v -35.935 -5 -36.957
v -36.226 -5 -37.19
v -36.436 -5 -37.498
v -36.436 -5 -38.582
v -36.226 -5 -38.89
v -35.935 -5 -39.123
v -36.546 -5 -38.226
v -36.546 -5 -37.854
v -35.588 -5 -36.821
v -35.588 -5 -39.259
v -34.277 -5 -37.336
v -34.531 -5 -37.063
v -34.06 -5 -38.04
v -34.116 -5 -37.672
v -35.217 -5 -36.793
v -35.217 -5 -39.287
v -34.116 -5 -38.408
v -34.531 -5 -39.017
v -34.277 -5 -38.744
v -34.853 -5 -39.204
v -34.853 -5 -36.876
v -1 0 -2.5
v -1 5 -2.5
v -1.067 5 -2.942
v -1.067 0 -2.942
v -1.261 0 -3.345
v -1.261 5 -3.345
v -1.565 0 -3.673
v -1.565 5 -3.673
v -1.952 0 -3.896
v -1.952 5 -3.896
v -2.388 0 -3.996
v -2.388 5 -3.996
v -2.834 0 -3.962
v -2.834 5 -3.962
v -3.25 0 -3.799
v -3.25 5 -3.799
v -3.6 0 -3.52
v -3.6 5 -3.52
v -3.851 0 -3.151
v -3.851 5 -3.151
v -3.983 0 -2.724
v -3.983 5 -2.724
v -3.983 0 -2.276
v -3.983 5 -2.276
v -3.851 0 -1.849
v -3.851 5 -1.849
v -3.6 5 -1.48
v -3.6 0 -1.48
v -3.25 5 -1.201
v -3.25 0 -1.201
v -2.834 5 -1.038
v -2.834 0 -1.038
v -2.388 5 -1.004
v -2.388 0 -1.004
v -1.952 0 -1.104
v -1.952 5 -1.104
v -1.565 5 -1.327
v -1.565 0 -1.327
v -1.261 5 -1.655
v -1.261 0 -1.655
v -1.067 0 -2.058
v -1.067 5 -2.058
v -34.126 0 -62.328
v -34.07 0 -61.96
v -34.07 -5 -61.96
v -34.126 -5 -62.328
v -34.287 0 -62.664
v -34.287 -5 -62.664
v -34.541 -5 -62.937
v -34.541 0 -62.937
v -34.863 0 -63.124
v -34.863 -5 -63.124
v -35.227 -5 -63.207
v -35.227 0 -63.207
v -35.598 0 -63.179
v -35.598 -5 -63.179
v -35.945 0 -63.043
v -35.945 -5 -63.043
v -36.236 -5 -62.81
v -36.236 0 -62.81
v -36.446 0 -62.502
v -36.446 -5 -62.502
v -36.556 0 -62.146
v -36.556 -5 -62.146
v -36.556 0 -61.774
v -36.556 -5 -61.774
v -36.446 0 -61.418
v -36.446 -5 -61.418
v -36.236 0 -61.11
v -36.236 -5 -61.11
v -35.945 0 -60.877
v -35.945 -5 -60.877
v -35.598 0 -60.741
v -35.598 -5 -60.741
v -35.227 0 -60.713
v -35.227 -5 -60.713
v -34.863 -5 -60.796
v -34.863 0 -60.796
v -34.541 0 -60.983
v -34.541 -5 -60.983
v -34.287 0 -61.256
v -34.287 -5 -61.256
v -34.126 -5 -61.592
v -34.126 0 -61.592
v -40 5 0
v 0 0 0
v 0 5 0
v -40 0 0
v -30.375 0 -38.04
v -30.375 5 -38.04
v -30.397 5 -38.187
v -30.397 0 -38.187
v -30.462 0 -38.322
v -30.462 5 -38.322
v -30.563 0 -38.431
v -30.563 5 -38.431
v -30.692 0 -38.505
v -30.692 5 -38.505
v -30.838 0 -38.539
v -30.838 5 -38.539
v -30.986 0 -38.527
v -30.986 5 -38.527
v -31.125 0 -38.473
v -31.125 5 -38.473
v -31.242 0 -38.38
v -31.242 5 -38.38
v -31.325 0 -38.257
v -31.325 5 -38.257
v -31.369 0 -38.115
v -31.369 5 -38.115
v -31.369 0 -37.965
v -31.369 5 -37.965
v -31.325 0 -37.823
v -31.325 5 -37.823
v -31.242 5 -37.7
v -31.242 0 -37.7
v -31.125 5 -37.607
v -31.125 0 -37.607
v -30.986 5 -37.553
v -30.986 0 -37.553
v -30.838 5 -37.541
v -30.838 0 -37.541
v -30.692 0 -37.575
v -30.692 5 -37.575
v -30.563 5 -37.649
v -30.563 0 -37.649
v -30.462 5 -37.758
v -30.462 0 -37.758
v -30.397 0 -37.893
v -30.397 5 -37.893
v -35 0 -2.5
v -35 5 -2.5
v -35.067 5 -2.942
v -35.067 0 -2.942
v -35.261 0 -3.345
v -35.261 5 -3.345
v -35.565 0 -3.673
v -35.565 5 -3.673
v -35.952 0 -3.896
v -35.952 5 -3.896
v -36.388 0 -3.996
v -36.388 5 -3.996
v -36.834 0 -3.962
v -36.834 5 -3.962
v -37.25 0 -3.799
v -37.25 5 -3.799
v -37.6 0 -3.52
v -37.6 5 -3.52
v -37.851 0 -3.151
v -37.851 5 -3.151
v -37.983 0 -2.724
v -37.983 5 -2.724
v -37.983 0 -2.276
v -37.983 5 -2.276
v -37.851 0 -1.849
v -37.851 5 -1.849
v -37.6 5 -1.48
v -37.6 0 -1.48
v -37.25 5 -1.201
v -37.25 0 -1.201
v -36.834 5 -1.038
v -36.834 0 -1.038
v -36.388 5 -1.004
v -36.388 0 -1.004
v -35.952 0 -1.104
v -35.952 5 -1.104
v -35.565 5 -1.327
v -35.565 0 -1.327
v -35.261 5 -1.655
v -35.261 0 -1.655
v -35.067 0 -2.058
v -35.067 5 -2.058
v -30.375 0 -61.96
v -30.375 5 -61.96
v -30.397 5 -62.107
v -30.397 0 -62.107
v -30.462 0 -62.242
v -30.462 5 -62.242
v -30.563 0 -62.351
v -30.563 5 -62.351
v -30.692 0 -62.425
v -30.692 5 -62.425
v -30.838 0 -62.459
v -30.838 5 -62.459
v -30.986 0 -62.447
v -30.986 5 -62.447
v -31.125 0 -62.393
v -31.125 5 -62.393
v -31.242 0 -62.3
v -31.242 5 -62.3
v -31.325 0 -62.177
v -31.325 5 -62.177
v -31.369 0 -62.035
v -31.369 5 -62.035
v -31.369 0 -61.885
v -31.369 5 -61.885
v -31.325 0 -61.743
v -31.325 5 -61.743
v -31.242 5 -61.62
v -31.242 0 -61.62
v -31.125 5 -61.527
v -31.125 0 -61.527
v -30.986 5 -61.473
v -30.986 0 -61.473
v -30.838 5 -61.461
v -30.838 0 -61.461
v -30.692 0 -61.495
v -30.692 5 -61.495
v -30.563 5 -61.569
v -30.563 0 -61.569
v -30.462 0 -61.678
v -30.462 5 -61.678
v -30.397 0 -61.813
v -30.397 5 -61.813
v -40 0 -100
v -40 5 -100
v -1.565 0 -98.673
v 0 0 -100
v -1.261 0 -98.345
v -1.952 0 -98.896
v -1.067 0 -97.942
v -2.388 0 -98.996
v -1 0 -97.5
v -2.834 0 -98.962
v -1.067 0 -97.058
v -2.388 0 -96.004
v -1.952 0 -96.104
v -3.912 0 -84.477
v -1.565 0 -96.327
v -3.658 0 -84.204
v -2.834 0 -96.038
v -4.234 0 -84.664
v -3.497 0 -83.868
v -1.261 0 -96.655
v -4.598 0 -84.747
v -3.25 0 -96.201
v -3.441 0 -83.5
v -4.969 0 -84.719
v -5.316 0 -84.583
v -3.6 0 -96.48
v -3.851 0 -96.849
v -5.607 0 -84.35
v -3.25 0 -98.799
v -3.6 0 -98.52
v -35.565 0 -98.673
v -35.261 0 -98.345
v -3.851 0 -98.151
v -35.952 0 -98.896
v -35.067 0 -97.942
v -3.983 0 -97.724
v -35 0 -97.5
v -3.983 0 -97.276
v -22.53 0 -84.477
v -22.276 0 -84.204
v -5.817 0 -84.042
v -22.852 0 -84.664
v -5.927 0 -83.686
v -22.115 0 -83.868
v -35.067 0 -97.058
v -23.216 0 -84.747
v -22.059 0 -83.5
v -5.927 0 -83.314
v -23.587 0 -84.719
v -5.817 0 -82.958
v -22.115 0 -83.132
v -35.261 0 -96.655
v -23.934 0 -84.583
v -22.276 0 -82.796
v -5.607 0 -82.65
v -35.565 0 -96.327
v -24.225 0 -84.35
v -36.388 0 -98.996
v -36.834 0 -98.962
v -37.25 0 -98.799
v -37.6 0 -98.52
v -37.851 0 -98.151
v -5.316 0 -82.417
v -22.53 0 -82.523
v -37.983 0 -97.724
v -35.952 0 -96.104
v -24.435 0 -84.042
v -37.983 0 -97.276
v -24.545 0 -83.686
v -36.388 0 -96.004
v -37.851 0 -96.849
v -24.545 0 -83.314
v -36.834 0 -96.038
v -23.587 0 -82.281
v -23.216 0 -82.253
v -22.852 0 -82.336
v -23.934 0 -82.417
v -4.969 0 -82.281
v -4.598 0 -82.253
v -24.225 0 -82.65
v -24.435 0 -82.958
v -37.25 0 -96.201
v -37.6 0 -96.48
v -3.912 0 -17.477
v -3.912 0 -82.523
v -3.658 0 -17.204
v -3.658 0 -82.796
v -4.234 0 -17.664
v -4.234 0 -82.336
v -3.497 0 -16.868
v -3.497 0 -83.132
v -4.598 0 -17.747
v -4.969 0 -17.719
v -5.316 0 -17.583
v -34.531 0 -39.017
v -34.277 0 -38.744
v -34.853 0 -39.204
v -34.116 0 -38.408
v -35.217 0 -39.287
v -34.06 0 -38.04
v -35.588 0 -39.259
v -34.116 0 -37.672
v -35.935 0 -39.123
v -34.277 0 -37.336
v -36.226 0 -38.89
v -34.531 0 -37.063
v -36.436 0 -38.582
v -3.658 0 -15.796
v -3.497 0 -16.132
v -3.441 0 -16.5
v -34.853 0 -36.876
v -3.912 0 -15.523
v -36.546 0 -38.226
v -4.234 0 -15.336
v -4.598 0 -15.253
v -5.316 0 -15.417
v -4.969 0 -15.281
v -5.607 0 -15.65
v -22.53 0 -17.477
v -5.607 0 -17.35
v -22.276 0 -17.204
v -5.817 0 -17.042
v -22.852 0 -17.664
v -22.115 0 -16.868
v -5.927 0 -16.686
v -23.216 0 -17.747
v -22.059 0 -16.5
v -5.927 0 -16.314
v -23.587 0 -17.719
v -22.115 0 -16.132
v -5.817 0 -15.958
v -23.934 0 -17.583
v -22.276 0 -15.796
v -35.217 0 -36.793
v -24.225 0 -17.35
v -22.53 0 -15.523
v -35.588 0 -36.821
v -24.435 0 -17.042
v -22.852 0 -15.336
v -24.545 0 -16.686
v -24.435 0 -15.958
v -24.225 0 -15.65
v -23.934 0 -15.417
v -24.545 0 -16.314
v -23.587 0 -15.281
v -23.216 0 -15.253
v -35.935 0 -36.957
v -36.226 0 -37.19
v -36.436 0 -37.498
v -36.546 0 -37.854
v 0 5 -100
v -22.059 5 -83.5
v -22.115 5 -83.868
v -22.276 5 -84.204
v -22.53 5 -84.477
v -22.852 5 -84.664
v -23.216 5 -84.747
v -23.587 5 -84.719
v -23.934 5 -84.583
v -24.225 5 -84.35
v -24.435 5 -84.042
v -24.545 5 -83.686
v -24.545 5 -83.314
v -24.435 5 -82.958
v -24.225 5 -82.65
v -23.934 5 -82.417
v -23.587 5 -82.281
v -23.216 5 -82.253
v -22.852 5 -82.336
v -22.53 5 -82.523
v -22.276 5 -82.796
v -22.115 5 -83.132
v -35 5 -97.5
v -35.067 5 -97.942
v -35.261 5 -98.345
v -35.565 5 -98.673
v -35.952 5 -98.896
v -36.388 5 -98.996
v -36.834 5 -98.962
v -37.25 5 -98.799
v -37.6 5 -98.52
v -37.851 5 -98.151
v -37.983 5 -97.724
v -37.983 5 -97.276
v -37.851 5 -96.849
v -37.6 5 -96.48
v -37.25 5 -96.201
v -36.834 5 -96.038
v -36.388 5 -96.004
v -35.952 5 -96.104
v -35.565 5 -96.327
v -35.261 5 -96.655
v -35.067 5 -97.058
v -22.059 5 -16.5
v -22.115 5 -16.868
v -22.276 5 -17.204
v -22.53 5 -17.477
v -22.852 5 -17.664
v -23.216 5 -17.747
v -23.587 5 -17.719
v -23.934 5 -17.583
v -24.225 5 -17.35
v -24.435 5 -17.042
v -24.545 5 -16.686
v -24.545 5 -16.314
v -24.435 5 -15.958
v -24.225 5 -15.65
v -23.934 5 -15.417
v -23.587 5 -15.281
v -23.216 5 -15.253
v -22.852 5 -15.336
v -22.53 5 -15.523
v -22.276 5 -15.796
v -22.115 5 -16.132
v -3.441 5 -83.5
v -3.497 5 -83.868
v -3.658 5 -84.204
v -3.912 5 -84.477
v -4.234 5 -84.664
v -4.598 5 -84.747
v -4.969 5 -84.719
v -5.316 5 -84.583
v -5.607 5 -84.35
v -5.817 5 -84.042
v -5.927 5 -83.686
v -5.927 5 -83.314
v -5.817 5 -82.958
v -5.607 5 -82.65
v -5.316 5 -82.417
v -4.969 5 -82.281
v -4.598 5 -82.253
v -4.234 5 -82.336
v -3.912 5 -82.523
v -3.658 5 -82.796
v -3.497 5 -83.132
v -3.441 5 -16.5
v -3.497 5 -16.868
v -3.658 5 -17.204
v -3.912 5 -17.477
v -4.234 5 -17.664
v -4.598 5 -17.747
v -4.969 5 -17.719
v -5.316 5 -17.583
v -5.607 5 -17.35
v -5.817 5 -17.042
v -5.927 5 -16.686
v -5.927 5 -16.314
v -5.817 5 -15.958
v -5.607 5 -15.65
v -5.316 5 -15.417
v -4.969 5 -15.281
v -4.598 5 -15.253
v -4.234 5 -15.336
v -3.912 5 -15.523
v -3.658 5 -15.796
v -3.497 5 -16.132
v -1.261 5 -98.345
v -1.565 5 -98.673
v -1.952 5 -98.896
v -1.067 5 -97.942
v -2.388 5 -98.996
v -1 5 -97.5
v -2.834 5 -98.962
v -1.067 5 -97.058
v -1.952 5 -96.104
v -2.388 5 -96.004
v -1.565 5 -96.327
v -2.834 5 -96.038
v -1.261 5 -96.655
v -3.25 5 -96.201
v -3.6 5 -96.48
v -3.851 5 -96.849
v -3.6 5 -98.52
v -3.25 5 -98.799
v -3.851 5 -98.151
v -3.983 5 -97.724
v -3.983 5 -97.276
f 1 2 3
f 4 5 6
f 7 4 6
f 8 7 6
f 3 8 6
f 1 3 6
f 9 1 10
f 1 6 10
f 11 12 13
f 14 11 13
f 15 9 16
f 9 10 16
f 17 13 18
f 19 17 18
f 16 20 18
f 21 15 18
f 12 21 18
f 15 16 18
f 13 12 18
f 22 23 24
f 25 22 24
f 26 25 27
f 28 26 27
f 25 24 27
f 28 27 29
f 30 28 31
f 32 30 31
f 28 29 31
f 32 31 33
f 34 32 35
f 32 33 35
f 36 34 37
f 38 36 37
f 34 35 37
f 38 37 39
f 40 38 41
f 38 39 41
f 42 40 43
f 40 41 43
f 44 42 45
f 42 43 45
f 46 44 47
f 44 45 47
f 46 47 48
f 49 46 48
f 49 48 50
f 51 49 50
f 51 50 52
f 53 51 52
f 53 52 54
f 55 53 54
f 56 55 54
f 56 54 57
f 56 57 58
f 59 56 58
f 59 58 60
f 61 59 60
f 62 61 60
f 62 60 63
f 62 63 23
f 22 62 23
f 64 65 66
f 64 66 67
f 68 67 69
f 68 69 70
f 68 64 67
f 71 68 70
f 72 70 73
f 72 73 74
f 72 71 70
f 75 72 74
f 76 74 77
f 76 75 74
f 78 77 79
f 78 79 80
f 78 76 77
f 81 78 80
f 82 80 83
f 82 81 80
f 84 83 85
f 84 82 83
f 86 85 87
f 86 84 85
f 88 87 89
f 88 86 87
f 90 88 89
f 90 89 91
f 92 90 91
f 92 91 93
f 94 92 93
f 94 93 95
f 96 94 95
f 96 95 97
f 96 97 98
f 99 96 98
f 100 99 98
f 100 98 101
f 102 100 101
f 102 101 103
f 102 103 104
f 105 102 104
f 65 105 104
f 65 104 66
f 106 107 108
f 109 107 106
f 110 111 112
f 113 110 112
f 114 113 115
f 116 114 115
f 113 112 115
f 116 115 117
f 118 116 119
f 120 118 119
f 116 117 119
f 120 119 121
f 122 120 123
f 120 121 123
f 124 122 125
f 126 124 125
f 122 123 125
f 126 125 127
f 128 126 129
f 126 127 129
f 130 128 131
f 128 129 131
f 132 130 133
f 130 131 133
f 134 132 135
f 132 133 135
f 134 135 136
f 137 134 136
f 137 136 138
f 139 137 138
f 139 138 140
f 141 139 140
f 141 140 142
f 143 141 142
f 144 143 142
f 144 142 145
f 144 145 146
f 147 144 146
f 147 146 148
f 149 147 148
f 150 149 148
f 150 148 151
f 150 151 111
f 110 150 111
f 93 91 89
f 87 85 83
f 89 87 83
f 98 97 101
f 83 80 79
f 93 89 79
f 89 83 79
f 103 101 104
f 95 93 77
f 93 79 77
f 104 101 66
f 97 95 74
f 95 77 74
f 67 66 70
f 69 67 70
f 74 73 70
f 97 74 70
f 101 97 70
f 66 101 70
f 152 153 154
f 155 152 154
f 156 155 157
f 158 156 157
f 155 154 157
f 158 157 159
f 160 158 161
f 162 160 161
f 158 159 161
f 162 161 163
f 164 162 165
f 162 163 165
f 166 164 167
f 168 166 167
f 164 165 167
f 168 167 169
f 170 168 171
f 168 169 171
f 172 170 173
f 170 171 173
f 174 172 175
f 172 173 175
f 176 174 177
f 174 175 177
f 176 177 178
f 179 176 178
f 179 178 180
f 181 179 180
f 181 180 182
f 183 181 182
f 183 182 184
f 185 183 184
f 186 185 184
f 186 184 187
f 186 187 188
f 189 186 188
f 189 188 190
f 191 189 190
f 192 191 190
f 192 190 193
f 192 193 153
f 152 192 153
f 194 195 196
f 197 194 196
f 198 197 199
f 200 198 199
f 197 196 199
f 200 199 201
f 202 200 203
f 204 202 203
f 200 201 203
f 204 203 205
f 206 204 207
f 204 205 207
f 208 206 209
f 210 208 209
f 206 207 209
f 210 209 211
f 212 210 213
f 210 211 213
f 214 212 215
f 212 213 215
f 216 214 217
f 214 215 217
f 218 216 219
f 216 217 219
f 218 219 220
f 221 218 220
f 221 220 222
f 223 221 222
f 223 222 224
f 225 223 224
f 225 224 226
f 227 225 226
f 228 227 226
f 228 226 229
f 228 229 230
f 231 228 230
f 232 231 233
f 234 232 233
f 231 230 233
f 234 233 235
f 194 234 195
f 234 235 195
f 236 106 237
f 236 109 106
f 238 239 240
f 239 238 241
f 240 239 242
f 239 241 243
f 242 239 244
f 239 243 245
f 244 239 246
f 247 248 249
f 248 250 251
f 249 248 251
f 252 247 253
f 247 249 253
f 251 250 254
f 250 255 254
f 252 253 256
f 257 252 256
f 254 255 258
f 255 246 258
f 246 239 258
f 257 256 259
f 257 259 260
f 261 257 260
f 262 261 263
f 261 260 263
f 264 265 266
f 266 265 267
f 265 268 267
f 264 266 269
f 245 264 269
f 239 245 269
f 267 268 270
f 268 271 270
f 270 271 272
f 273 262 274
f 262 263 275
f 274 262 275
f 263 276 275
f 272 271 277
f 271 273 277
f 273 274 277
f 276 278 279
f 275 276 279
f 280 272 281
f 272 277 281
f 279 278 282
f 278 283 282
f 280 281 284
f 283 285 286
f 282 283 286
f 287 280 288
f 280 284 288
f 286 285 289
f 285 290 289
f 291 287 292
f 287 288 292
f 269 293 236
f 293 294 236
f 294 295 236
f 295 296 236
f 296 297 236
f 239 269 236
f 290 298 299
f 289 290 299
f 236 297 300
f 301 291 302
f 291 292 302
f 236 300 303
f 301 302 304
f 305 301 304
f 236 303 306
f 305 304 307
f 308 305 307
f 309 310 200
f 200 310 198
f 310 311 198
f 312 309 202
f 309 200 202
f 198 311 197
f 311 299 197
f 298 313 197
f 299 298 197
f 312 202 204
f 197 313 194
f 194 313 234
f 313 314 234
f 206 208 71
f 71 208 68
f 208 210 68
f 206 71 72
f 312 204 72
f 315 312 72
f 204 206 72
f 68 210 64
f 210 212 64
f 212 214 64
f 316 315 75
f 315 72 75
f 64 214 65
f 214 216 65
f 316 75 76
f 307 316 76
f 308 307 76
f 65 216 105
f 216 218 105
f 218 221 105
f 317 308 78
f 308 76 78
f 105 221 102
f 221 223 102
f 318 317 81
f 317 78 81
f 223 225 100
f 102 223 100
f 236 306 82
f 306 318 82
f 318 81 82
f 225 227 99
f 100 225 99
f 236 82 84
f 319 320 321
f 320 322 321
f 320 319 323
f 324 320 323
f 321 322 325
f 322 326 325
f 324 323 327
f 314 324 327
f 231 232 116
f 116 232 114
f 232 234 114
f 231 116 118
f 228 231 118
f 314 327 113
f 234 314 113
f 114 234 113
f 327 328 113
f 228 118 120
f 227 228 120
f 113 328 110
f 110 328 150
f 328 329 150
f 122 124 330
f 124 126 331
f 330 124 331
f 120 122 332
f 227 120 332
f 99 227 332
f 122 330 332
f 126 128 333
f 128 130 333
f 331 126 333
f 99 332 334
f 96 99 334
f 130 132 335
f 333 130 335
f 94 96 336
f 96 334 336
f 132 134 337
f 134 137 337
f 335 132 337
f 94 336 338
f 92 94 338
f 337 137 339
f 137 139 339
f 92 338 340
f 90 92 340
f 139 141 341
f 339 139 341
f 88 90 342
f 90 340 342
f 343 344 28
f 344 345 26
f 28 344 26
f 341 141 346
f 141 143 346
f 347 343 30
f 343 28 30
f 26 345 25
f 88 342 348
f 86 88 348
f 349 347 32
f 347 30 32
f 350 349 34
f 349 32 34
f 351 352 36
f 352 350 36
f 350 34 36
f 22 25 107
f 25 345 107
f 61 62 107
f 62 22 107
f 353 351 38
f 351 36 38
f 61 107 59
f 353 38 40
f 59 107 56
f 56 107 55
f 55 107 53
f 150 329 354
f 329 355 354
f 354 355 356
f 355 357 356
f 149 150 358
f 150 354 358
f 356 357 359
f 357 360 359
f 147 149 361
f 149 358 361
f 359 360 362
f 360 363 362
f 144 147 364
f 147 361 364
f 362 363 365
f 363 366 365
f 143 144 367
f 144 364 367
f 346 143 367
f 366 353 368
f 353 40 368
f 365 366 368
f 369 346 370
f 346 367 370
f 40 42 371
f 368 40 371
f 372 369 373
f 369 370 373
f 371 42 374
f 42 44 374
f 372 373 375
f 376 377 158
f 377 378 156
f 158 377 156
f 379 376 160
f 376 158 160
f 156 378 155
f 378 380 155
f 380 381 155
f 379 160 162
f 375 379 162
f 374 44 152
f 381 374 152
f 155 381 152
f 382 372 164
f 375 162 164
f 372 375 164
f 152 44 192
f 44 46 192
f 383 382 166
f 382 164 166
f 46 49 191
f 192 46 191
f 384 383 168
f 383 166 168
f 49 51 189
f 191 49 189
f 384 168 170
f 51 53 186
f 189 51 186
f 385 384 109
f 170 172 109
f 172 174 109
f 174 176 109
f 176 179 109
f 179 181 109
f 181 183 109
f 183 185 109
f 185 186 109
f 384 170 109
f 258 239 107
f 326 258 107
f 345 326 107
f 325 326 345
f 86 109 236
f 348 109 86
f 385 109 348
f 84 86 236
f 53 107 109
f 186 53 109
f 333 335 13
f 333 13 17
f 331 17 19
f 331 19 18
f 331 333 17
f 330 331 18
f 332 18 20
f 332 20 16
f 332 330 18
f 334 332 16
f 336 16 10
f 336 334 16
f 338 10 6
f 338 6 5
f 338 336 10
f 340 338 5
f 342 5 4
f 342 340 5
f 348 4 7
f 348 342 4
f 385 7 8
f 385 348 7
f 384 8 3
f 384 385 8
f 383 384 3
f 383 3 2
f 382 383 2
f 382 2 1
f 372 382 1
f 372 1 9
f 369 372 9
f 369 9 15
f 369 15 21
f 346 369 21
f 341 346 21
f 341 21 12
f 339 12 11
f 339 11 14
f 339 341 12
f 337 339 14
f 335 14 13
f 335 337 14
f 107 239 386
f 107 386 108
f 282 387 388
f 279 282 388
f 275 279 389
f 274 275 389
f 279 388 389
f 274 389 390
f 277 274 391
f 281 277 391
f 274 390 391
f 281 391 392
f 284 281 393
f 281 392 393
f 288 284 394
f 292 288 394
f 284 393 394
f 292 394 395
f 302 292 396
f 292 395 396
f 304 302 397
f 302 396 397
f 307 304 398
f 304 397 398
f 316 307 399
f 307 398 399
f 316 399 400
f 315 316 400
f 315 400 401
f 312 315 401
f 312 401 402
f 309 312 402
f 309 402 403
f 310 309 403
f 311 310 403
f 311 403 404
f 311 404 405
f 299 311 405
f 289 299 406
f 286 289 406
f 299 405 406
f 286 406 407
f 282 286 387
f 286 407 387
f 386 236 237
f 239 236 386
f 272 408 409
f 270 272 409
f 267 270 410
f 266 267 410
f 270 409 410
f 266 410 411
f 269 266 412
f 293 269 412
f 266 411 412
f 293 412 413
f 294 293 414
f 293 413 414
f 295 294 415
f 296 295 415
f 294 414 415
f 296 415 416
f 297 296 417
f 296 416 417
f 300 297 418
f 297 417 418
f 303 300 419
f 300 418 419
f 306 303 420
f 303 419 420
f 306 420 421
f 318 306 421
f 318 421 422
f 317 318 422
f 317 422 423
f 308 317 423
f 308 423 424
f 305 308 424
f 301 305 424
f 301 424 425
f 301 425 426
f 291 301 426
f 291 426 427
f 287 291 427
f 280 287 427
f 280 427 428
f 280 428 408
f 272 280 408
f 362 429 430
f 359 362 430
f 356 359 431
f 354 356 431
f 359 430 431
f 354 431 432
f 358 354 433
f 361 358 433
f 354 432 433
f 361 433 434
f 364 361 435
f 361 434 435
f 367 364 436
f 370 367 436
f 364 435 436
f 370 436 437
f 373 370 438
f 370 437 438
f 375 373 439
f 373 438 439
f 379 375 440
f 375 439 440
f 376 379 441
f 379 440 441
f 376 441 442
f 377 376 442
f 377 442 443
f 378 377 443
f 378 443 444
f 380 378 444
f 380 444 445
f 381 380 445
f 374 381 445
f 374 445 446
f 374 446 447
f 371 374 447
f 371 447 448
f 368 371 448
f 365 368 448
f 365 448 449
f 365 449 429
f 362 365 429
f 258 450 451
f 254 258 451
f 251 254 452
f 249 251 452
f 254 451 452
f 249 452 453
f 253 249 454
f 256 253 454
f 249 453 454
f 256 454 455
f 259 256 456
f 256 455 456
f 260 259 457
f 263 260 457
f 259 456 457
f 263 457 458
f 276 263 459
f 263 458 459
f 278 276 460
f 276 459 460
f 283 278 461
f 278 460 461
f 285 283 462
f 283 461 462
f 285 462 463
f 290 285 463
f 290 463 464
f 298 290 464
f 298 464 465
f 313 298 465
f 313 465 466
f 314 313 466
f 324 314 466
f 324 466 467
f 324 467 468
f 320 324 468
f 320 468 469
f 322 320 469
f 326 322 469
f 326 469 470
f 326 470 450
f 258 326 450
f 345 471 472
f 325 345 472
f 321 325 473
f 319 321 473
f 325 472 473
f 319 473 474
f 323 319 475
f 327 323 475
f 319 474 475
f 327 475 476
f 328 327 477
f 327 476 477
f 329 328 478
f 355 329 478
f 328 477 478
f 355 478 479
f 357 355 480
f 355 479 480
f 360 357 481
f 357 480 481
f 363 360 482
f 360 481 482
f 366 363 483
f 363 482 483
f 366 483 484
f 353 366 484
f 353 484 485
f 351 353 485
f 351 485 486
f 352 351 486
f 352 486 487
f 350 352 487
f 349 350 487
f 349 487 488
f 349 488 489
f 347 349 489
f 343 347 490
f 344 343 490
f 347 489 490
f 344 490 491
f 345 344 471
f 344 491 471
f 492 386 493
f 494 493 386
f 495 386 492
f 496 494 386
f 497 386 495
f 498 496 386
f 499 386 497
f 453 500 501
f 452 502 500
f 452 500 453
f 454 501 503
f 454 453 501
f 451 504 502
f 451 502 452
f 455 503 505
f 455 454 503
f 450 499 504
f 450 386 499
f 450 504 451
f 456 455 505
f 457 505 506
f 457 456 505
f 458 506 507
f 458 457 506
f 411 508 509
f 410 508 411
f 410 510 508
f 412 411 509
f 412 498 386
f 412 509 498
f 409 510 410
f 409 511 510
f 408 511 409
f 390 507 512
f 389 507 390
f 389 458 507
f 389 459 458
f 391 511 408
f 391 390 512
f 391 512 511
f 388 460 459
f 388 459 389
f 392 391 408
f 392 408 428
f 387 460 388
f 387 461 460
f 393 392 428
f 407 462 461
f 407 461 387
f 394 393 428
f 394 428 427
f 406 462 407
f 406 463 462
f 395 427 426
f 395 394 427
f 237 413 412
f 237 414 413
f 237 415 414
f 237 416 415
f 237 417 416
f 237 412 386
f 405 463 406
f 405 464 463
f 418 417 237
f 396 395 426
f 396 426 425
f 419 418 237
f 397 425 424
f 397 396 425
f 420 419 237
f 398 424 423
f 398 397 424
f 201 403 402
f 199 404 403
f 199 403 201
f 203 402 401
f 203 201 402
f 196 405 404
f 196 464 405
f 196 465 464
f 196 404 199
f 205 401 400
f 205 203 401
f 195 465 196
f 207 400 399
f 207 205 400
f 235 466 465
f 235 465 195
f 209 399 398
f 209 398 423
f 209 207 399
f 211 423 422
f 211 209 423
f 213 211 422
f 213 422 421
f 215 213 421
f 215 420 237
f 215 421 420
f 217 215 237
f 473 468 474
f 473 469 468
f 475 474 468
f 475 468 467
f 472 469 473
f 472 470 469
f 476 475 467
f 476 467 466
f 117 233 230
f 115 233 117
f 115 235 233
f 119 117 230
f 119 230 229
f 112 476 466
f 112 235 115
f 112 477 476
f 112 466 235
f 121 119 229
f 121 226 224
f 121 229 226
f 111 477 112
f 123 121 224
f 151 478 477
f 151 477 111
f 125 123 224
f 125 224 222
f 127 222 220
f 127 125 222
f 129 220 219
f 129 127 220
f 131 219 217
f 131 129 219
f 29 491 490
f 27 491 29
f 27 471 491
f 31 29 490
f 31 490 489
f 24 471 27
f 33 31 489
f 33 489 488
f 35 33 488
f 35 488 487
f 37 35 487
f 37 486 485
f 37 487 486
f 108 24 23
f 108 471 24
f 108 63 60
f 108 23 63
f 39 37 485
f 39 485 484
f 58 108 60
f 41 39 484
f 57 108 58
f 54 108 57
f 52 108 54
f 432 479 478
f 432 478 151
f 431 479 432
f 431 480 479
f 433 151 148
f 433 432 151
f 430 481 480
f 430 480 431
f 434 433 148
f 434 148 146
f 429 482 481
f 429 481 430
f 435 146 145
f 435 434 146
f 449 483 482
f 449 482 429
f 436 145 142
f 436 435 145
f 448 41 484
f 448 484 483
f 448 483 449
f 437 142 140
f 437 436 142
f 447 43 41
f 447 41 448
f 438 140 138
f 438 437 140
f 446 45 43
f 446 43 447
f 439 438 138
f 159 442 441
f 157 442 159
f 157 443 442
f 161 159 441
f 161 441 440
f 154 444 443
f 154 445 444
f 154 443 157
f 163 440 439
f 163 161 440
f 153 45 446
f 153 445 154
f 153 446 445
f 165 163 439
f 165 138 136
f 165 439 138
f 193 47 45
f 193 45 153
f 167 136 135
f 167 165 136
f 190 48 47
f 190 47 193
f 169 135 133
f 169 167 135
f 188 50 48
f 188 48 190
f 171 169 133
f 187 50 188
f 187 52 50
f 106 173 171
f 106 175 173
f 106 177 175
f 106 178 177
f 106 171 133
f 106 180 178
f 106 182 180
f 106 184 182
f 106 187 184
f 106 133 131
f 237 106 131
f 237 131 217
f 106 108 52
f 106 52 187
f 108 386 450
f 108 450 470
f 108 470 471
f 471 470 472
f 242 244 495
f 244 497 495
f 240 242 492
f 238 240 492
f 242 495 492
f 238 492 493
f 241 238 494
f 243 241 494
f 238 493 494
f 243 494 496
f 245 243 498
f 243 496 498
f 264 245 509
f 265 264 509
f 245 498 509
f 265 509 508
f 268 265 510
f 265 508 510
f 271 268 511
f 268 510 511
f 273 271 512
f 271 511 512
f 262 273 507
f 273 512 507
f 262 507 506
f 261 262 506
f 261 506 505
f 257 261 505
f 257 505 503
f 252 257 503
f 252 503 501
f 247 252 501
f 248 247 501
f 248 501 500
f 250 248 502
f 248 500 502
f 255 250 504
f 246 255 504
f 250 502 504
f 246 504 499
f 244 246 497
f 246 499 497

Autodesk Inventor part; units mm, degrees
ref_plane "YZ Plane" through (0, 0, 0) normal (1, 0, 0) x (0, 1, 0)
ref_plane "XZ Plane" through (0, 0, 0) normal (0, 1, 0) x (-1, 0, 0)
ref_plane "XY Plane" through (0, 0, 0) normal (0, 0, 1) x (1, 0, 0)
sketch "Boceto1" plane through (0, 0, 0) normal (0, 1, 0) x (-1, 0, 0)
  line L0 (0, 0) -> (40, 0)
  line L1 (40, 0) -> (40, -100)
  line L2 (40, -100) -> (0, -100)
  line L3 (0, -100) -> (0, 0)
  circle A0 centre (19.95, -16.5) radius 1.5
  circle A1 centre (4, -16.5) radius 1.5
  circle A2 centre (19.95, -83.5) radius 1.5
  circle A3 centre (4, -83.5) radius 1.5
  point P0 (20, 0)
  dimension "d0" = 40
  dimension "d1" = 100
  dimension "d2" = 3
  dimension "d3" = 3
  dimension "d4" = 3
  dimension "d5" = 3
  dimension "d6" = 16.5
  dimension "d7" = 4
  dimension "d8" = 15.95
  dimension "d9" = 16.5
  dimension "d10" = 16.5
  dimension "d11" = 16.5
  dimension "d12" = 4
  dimension "d13" = 15.95
extrude "Extrusión1" add sketch "Boceto1" along normal blind 5
sketch "Boceto2" plane through (0, 5, 0) normal (0, 1, 0) x (1, 0, 0)
  circle A0 centre (-2.5, 2.5) radius 1.5
  line L0 (0, 0) -> (0, 100) projected
  line L1 (-40, 0) -> (0, 0) projected
  circle A1 centre (-2.5, 97.5) radius 1.5
  line L2 (0, 100) -> (-40, 100) projected
  dimension "d16" = 3
  dimension "d17" = 2.5
  dimension "d18" = 2.5
  dimension "d19" = 3
  dimension "d20" = 2.5
  dimension "d21" = 2.5
extrude "Extrusión2" cut sketch "Boceto2" against normal blind 5
sketch "Boceto3" plane through (0, 5, 0) normal (0, 1, 0) x (1, 0, 0)
  line L0 (-40, 0) -> (0, 0) projected
  line L1 (-14.618, 24) -> (-8, 24)
  line L2 (-8, 24) -> (-8, 9)
  line L3 (-8, 9) -> (-14.618, 9)
  line L4 (-14.618, 9) -> (-14.618, 24)
  line L5 (0, 0) -> (0, 100) projected
  line L6 (-14.618, 91) -> (-8, 91)
  line L7 (-8, 91) -> (-8, 76)
  line L8 (-8, 76) -> (-14.618, 76)
  line L9 (-14.618, 76) -> (-14.618, 91)
  line L10 (0, 100) -> (-40, 100) projected
  dimension "d33" = 15
  dimension "d34" = 6.618
  dimension "d35" = 9
  dimension "d36" = 8
  dimension "d37" = 15
  dimension "d38" = 6.618
  dimension "d39" = 8
  dimension "d40" = 9
sketch "Boceto4" plane through (0, 5, 0) normal (0, 1, 0) x (1, 0, 0)
  point P0 (0, 0)
extrude "Extrusión3" cut sketch "Boceto3" against normal blind 0.5
sketch "Boceto5" plane through (0, 5, 0) normal (0, 1, 0) x (1, 0, 0)
  circle A0 centre (-19.95, 16.5) radius 1.5 projected
  circle A1 centre (-19.95, 16.5) radius 1.5
  circle A2 centre (-4, 16.5) radius 1.5 projected
  circle A3 centre (-4, 16.5) radius 1.5
  circle A4 centre (-19.95, 83.5) radius 1.5 projected
  circle A5 centre (-19.95, 83.5) radius 1.5
  circle A6 centre (-4, 83.5) radius 1.5 projected
  circle A7 centre (-4, 83.5) radius 1.5
  point P0 (0, 0)
extrude "Extrusión4" add sketch "Boceto5" against normal blind 5
sketch "Boceto6" plane through (0, 5, 0) normal (0, 1, 0) x (1, 0, 0)
  line L0 (-8, 24) -> (-8, 9) projected
  line L1 (-8, 9) -> (-8, 16.5)
  line L2 (-8, 16.5) -> (-8, 19.5)
  line L3 (-14.618, 9) -> (-14.618, 24) projected
  line L4 (-14.618, 9) -> (-14.618, 16.5)
  circle A0 centre (-4, 16.5) radius 1.25
  circle A1 centre (-18.618, 16.5) radius 1.25
  circle A2 centre (-4, 83.5) radius 1.25
  circle A3 centre (-18.618, 83.5) radius 1.25
  line L5 (-8, 91) -> (-8, 76) projected
  line L6 (-14.618, 76) -> (-14.618, 91) projected
  line L7 (-14.618, 91) -> (-8, 91) projected
  point P0 (0, 0)
  dimension "d45" = 7.5
  dimension "d49" = 2.5
  dimension "d50" = 2.5
  dimension "d51" = 4
  dimension "d52" = 4
  dimension "d53" = 2.5
  dimension "d54" = 2.5
  dimension "d55" = 4
  dimension "d56" = 4
  dimension "d57" = 7.5
  dimension "d58" = 7.5
extrude "Extrusión5" cut sketch "Boceto6" against normal blind 5
sketch "Boceto7" plane through (0, 5, 0) normal (0, 1, 0) x (1, 0, 0)
  circle A0 centre (-18.618, 16.5) radius 1.25 projected
  circle A1 centre (-18.618, 16.5) radius 1.25
  circle A2 centre (-4, 16.5) radius 1.25 projected
  circle A3 centre (-4, 16.5) radius 1.25
  circle A4 centre (-18.618, 83.5) radius 1.25 projected
  circle A5 centre (-18.618, 83.5) radius 1.25
  circle A6 centre (-4, 83.5) radius 1.25 projected
  circle A7 centre (-4, 83.5) radius 1.25
  point P0 (0, 0)
extrude "Extrusión6" add sketch "Boceto7" against normal blind 5
sketch "Boceto8" plane through (0, 5, 0) normal (0, 1, 0) x (1, 0, 0)
  circle A0 centre (-20.618, 16.5) radius 1.25
  circle A1 centre (-2, 16.5) radius 1.25
  line L0 (-8, 24) -> (-8, 9) projected
  line L1 (-14.618, 9) -> (-14.618, 24) projected
  line L2 (-8, 9) -> (-14.618, 9) projected
  circle A2 centre (-2, 83.5) radius 1.25
  circle A3 centre (-20.618, 83.5) radius 1.25
  line L3 (-14.618, 91) -> (-8, 91) projected
  line L4 (-8, 91) -> (-8, 76) projected
  line L5 (-14.618, 76) -> (-14.618, 91) projected
  point P0 (0, 0)
  point P1 (-8, 83.5)
  dimension "d63" = 2.5
  dimension "d64" = 2.5
  dimension "d65" = 6
  dimension "d66" = 6
  dimension "d67" = 7.5
  dimension "d68" = 7.5
  dimension "d69" = 2.5
  dimension "d70" = 2.5
  dimension "d71" = 7.5
  dimension "d72" = 7.5
  dimension "d73" = 6
  dimension "d74" = 6
extrude "Extrusión7" cut sketch "Boceto8" against normal blind 6
sketch "Boceto9" plane through (0, 5, 0) normal (0, 1, 0) x (1, 0, 0)
  line L0 (-14.618, 9) -> (-14.618, 24) projected
  line L1 (-8, 24) -> (-8, 9) projected
  line L2 (-14.618, 24) -> (-8, 24)
  line L3 (-8, 24) -> (-8, 9)
  line L4 (-8, 9) -> (-14.618, 9)
  line L5 (-14.618, 9) -> (-14.618, 24)
  line L6 (-14.618, 91) -> (-8, 91) projected
  line L7 (-8, 76) -> (-14.618, 76) projected
  line L8 (-14.618, 91) -> (-8, 91)
  line L9 (-8, 91) -> (-8, 76)
  line L10 (-8, 76) -> (-14.618, 76)
  line L11 (-14.618, 76) -> (-14.618, 91)
  line L12 (-8, 91) -> (-8, 76) projected
  line L13 (-14.618, 91) -> (-8, 91)
  line L14 (-8, 91) -> (-8, 76)
  line L15 (-8, 76) -> (-14.618, 76)
  line L16 (-14.618, 76) -> (-14.618, 91)
  line L17 (-14.618, 24) -> (-8, 24)
  line L18 (-8, 24) -> (-8, 9)
  line L19 (-8, 9) -> (-14.618, 9)
  line L20 (-14.618, 9) -> (-14.618, 24)
  point P0 (0, 0)
extrude "Extrusión8" add sketch "Boceto9" against normal blind 0.5
sketch "Boceto10" plane through (0, 5, 0) normal (0, 1, 0) x (1, 0, 0)
  circle A0 centre (-2, 16.5) radius 1.25 projected
  circle A1 centre (-2, 16.5) radius 1.25
  circle A2 centre (-4.691, 16.5) radius 1.25
  circle A3 centre (-23.309, 16.5) radius 1.25
  circle A4 centre (-20.618, 16.5) radius 1.25 projected
  circle A5 centre (-4.691, 83.5) radius 1.25
  circle A6 centre (-23.309, 83.5) radius 1.25
  circle A7 centre (-2, 83.5) radius 1.25 projected
  circle A8 centre (-20.618, 83.5) radius 1.25 projected
  point P0 (0, 0)
  dimension "d79" = 2.5
  dimension "d80" = 2.691
  dimension "d81" = 2.5
  dimension "d82" = 2.691
  dimension "d83" = 2.5
  dimension "d84" = 2.5
  dimension "d85" = 2.691
  dimension "d86" = 2.691
extrude "Extrusión9" cut sketch "Boceto10" against normal blind 5 contours A2 | A3 | A5 | A6
sketch "Boceto11" plane through (0, 5, 0) normal (0, 1, 0) x (1, 0, 0)
  circle A0 centre (-20.618, 16.5) radius 1.25 projected
  circle A1 centre (-20.618, 16.5) radius 1.25
  circle A2 centre (-2, 16.5) radius 1.25 projected
  circle A3 centre (-2, 16.5) radius 1.25
  circle A4 centre (-20.618, 83.5) radius 1.25 projected
  circle A5 centre (-20.618, 83.5) radius 1.25
  circle A6 centre (-2, 83.5) radius 1.25 projected
  circle A7 centre (-2, 83.5) radius 1.25
  point P0 (0, 0)
extrude "Extrusión10" add sketch "Boceto11" against normal blind 5
sketch "Boceto12" plane through (0, 5, 0) normal (0, 1, 0) x (1, 0, 0)
  circle A0 centre (-36.5, 2.5) radius 1.5
  circle A1 centre (-2.5, 2.5) radius 1.5 projected
  circle A2 centre (-36.5, 97.5) radius 1.5
  circle A3 centre (-2.5, 97.5) radius 1.5 projected
  point P0 (0, 0)
  dimension "d91" = 3
  dimension "d92" = 34
  dimension "d93" = 3
  dimension "d94" = 34
extrude "Extrusión11" cut sketch "Boceto12" against normal blind 10 contours A0 | A2
sketch "Boceto13" plane through (0, 5, 0) normal (0, 1, 0) x (1, 0, 0)
  circle A0 centre (-35.31, 38.04) radius 1.25
  circle A1 centre (-35.32, 61.96) radius 1.25
  line L0 (-40, 100) -> (-40, 0) projected
  line L1 (-40, 0) -> (0, 0) projected
  dimension "d97" = 2.5
  dimension "d98" = 2.5
  dimension "d99" = 23.92
  dimension "d100" = 4.68
  dimension "d101" = 4.69
  dimension "d102" = 38.04
extrude "Extrusión12" cut sketch "Boceto13" against normal blind 10
sketch "Boceto14" plane through (0, 5, 0) normal (0, 1, 0) x (1, 0, 0)
  circle A0 centre (-30.875, 61.96) radius 0.5
  line L0 (-40, 100) -> (-40, 0) projected
  line L1 (0, 100) -> (-40, 100) projected
  circle A1 centre (-30.875, 38.04) radius 0.5
  line L2 (-40, 0) -> (0, 0) projected
  dimension "d105" = 1
  dimension "d106" = 9.125
  dimension "d107" = 38.04
  dimension "d108" = 1
  dimension "d109" = 9.125
  dimension "d110" = 38.04
extrude "Extrusión13" cut sketch "Boceto14" against normal blind 10
sketch "Boceto15" plane through (0, 5, 0) normal (0, 1, 0) x (1, 0, 0)
  circle A0 centre (-35.31, 38.04) radius 1.25 projected
  circle A1 centre (-35.31, 38.04) radius 1.25
  circle A2 centre (-35.32, 61.96) radius 1.25 projected
  circle A3 centre (-35.32, 61.96) radius 1.25
  point P0 (0, 0)
extrude "Extrusión14" add sketch "Boceto15" against normal blind 10
equation "\"d75\" = d73"
properties part number "Base"
